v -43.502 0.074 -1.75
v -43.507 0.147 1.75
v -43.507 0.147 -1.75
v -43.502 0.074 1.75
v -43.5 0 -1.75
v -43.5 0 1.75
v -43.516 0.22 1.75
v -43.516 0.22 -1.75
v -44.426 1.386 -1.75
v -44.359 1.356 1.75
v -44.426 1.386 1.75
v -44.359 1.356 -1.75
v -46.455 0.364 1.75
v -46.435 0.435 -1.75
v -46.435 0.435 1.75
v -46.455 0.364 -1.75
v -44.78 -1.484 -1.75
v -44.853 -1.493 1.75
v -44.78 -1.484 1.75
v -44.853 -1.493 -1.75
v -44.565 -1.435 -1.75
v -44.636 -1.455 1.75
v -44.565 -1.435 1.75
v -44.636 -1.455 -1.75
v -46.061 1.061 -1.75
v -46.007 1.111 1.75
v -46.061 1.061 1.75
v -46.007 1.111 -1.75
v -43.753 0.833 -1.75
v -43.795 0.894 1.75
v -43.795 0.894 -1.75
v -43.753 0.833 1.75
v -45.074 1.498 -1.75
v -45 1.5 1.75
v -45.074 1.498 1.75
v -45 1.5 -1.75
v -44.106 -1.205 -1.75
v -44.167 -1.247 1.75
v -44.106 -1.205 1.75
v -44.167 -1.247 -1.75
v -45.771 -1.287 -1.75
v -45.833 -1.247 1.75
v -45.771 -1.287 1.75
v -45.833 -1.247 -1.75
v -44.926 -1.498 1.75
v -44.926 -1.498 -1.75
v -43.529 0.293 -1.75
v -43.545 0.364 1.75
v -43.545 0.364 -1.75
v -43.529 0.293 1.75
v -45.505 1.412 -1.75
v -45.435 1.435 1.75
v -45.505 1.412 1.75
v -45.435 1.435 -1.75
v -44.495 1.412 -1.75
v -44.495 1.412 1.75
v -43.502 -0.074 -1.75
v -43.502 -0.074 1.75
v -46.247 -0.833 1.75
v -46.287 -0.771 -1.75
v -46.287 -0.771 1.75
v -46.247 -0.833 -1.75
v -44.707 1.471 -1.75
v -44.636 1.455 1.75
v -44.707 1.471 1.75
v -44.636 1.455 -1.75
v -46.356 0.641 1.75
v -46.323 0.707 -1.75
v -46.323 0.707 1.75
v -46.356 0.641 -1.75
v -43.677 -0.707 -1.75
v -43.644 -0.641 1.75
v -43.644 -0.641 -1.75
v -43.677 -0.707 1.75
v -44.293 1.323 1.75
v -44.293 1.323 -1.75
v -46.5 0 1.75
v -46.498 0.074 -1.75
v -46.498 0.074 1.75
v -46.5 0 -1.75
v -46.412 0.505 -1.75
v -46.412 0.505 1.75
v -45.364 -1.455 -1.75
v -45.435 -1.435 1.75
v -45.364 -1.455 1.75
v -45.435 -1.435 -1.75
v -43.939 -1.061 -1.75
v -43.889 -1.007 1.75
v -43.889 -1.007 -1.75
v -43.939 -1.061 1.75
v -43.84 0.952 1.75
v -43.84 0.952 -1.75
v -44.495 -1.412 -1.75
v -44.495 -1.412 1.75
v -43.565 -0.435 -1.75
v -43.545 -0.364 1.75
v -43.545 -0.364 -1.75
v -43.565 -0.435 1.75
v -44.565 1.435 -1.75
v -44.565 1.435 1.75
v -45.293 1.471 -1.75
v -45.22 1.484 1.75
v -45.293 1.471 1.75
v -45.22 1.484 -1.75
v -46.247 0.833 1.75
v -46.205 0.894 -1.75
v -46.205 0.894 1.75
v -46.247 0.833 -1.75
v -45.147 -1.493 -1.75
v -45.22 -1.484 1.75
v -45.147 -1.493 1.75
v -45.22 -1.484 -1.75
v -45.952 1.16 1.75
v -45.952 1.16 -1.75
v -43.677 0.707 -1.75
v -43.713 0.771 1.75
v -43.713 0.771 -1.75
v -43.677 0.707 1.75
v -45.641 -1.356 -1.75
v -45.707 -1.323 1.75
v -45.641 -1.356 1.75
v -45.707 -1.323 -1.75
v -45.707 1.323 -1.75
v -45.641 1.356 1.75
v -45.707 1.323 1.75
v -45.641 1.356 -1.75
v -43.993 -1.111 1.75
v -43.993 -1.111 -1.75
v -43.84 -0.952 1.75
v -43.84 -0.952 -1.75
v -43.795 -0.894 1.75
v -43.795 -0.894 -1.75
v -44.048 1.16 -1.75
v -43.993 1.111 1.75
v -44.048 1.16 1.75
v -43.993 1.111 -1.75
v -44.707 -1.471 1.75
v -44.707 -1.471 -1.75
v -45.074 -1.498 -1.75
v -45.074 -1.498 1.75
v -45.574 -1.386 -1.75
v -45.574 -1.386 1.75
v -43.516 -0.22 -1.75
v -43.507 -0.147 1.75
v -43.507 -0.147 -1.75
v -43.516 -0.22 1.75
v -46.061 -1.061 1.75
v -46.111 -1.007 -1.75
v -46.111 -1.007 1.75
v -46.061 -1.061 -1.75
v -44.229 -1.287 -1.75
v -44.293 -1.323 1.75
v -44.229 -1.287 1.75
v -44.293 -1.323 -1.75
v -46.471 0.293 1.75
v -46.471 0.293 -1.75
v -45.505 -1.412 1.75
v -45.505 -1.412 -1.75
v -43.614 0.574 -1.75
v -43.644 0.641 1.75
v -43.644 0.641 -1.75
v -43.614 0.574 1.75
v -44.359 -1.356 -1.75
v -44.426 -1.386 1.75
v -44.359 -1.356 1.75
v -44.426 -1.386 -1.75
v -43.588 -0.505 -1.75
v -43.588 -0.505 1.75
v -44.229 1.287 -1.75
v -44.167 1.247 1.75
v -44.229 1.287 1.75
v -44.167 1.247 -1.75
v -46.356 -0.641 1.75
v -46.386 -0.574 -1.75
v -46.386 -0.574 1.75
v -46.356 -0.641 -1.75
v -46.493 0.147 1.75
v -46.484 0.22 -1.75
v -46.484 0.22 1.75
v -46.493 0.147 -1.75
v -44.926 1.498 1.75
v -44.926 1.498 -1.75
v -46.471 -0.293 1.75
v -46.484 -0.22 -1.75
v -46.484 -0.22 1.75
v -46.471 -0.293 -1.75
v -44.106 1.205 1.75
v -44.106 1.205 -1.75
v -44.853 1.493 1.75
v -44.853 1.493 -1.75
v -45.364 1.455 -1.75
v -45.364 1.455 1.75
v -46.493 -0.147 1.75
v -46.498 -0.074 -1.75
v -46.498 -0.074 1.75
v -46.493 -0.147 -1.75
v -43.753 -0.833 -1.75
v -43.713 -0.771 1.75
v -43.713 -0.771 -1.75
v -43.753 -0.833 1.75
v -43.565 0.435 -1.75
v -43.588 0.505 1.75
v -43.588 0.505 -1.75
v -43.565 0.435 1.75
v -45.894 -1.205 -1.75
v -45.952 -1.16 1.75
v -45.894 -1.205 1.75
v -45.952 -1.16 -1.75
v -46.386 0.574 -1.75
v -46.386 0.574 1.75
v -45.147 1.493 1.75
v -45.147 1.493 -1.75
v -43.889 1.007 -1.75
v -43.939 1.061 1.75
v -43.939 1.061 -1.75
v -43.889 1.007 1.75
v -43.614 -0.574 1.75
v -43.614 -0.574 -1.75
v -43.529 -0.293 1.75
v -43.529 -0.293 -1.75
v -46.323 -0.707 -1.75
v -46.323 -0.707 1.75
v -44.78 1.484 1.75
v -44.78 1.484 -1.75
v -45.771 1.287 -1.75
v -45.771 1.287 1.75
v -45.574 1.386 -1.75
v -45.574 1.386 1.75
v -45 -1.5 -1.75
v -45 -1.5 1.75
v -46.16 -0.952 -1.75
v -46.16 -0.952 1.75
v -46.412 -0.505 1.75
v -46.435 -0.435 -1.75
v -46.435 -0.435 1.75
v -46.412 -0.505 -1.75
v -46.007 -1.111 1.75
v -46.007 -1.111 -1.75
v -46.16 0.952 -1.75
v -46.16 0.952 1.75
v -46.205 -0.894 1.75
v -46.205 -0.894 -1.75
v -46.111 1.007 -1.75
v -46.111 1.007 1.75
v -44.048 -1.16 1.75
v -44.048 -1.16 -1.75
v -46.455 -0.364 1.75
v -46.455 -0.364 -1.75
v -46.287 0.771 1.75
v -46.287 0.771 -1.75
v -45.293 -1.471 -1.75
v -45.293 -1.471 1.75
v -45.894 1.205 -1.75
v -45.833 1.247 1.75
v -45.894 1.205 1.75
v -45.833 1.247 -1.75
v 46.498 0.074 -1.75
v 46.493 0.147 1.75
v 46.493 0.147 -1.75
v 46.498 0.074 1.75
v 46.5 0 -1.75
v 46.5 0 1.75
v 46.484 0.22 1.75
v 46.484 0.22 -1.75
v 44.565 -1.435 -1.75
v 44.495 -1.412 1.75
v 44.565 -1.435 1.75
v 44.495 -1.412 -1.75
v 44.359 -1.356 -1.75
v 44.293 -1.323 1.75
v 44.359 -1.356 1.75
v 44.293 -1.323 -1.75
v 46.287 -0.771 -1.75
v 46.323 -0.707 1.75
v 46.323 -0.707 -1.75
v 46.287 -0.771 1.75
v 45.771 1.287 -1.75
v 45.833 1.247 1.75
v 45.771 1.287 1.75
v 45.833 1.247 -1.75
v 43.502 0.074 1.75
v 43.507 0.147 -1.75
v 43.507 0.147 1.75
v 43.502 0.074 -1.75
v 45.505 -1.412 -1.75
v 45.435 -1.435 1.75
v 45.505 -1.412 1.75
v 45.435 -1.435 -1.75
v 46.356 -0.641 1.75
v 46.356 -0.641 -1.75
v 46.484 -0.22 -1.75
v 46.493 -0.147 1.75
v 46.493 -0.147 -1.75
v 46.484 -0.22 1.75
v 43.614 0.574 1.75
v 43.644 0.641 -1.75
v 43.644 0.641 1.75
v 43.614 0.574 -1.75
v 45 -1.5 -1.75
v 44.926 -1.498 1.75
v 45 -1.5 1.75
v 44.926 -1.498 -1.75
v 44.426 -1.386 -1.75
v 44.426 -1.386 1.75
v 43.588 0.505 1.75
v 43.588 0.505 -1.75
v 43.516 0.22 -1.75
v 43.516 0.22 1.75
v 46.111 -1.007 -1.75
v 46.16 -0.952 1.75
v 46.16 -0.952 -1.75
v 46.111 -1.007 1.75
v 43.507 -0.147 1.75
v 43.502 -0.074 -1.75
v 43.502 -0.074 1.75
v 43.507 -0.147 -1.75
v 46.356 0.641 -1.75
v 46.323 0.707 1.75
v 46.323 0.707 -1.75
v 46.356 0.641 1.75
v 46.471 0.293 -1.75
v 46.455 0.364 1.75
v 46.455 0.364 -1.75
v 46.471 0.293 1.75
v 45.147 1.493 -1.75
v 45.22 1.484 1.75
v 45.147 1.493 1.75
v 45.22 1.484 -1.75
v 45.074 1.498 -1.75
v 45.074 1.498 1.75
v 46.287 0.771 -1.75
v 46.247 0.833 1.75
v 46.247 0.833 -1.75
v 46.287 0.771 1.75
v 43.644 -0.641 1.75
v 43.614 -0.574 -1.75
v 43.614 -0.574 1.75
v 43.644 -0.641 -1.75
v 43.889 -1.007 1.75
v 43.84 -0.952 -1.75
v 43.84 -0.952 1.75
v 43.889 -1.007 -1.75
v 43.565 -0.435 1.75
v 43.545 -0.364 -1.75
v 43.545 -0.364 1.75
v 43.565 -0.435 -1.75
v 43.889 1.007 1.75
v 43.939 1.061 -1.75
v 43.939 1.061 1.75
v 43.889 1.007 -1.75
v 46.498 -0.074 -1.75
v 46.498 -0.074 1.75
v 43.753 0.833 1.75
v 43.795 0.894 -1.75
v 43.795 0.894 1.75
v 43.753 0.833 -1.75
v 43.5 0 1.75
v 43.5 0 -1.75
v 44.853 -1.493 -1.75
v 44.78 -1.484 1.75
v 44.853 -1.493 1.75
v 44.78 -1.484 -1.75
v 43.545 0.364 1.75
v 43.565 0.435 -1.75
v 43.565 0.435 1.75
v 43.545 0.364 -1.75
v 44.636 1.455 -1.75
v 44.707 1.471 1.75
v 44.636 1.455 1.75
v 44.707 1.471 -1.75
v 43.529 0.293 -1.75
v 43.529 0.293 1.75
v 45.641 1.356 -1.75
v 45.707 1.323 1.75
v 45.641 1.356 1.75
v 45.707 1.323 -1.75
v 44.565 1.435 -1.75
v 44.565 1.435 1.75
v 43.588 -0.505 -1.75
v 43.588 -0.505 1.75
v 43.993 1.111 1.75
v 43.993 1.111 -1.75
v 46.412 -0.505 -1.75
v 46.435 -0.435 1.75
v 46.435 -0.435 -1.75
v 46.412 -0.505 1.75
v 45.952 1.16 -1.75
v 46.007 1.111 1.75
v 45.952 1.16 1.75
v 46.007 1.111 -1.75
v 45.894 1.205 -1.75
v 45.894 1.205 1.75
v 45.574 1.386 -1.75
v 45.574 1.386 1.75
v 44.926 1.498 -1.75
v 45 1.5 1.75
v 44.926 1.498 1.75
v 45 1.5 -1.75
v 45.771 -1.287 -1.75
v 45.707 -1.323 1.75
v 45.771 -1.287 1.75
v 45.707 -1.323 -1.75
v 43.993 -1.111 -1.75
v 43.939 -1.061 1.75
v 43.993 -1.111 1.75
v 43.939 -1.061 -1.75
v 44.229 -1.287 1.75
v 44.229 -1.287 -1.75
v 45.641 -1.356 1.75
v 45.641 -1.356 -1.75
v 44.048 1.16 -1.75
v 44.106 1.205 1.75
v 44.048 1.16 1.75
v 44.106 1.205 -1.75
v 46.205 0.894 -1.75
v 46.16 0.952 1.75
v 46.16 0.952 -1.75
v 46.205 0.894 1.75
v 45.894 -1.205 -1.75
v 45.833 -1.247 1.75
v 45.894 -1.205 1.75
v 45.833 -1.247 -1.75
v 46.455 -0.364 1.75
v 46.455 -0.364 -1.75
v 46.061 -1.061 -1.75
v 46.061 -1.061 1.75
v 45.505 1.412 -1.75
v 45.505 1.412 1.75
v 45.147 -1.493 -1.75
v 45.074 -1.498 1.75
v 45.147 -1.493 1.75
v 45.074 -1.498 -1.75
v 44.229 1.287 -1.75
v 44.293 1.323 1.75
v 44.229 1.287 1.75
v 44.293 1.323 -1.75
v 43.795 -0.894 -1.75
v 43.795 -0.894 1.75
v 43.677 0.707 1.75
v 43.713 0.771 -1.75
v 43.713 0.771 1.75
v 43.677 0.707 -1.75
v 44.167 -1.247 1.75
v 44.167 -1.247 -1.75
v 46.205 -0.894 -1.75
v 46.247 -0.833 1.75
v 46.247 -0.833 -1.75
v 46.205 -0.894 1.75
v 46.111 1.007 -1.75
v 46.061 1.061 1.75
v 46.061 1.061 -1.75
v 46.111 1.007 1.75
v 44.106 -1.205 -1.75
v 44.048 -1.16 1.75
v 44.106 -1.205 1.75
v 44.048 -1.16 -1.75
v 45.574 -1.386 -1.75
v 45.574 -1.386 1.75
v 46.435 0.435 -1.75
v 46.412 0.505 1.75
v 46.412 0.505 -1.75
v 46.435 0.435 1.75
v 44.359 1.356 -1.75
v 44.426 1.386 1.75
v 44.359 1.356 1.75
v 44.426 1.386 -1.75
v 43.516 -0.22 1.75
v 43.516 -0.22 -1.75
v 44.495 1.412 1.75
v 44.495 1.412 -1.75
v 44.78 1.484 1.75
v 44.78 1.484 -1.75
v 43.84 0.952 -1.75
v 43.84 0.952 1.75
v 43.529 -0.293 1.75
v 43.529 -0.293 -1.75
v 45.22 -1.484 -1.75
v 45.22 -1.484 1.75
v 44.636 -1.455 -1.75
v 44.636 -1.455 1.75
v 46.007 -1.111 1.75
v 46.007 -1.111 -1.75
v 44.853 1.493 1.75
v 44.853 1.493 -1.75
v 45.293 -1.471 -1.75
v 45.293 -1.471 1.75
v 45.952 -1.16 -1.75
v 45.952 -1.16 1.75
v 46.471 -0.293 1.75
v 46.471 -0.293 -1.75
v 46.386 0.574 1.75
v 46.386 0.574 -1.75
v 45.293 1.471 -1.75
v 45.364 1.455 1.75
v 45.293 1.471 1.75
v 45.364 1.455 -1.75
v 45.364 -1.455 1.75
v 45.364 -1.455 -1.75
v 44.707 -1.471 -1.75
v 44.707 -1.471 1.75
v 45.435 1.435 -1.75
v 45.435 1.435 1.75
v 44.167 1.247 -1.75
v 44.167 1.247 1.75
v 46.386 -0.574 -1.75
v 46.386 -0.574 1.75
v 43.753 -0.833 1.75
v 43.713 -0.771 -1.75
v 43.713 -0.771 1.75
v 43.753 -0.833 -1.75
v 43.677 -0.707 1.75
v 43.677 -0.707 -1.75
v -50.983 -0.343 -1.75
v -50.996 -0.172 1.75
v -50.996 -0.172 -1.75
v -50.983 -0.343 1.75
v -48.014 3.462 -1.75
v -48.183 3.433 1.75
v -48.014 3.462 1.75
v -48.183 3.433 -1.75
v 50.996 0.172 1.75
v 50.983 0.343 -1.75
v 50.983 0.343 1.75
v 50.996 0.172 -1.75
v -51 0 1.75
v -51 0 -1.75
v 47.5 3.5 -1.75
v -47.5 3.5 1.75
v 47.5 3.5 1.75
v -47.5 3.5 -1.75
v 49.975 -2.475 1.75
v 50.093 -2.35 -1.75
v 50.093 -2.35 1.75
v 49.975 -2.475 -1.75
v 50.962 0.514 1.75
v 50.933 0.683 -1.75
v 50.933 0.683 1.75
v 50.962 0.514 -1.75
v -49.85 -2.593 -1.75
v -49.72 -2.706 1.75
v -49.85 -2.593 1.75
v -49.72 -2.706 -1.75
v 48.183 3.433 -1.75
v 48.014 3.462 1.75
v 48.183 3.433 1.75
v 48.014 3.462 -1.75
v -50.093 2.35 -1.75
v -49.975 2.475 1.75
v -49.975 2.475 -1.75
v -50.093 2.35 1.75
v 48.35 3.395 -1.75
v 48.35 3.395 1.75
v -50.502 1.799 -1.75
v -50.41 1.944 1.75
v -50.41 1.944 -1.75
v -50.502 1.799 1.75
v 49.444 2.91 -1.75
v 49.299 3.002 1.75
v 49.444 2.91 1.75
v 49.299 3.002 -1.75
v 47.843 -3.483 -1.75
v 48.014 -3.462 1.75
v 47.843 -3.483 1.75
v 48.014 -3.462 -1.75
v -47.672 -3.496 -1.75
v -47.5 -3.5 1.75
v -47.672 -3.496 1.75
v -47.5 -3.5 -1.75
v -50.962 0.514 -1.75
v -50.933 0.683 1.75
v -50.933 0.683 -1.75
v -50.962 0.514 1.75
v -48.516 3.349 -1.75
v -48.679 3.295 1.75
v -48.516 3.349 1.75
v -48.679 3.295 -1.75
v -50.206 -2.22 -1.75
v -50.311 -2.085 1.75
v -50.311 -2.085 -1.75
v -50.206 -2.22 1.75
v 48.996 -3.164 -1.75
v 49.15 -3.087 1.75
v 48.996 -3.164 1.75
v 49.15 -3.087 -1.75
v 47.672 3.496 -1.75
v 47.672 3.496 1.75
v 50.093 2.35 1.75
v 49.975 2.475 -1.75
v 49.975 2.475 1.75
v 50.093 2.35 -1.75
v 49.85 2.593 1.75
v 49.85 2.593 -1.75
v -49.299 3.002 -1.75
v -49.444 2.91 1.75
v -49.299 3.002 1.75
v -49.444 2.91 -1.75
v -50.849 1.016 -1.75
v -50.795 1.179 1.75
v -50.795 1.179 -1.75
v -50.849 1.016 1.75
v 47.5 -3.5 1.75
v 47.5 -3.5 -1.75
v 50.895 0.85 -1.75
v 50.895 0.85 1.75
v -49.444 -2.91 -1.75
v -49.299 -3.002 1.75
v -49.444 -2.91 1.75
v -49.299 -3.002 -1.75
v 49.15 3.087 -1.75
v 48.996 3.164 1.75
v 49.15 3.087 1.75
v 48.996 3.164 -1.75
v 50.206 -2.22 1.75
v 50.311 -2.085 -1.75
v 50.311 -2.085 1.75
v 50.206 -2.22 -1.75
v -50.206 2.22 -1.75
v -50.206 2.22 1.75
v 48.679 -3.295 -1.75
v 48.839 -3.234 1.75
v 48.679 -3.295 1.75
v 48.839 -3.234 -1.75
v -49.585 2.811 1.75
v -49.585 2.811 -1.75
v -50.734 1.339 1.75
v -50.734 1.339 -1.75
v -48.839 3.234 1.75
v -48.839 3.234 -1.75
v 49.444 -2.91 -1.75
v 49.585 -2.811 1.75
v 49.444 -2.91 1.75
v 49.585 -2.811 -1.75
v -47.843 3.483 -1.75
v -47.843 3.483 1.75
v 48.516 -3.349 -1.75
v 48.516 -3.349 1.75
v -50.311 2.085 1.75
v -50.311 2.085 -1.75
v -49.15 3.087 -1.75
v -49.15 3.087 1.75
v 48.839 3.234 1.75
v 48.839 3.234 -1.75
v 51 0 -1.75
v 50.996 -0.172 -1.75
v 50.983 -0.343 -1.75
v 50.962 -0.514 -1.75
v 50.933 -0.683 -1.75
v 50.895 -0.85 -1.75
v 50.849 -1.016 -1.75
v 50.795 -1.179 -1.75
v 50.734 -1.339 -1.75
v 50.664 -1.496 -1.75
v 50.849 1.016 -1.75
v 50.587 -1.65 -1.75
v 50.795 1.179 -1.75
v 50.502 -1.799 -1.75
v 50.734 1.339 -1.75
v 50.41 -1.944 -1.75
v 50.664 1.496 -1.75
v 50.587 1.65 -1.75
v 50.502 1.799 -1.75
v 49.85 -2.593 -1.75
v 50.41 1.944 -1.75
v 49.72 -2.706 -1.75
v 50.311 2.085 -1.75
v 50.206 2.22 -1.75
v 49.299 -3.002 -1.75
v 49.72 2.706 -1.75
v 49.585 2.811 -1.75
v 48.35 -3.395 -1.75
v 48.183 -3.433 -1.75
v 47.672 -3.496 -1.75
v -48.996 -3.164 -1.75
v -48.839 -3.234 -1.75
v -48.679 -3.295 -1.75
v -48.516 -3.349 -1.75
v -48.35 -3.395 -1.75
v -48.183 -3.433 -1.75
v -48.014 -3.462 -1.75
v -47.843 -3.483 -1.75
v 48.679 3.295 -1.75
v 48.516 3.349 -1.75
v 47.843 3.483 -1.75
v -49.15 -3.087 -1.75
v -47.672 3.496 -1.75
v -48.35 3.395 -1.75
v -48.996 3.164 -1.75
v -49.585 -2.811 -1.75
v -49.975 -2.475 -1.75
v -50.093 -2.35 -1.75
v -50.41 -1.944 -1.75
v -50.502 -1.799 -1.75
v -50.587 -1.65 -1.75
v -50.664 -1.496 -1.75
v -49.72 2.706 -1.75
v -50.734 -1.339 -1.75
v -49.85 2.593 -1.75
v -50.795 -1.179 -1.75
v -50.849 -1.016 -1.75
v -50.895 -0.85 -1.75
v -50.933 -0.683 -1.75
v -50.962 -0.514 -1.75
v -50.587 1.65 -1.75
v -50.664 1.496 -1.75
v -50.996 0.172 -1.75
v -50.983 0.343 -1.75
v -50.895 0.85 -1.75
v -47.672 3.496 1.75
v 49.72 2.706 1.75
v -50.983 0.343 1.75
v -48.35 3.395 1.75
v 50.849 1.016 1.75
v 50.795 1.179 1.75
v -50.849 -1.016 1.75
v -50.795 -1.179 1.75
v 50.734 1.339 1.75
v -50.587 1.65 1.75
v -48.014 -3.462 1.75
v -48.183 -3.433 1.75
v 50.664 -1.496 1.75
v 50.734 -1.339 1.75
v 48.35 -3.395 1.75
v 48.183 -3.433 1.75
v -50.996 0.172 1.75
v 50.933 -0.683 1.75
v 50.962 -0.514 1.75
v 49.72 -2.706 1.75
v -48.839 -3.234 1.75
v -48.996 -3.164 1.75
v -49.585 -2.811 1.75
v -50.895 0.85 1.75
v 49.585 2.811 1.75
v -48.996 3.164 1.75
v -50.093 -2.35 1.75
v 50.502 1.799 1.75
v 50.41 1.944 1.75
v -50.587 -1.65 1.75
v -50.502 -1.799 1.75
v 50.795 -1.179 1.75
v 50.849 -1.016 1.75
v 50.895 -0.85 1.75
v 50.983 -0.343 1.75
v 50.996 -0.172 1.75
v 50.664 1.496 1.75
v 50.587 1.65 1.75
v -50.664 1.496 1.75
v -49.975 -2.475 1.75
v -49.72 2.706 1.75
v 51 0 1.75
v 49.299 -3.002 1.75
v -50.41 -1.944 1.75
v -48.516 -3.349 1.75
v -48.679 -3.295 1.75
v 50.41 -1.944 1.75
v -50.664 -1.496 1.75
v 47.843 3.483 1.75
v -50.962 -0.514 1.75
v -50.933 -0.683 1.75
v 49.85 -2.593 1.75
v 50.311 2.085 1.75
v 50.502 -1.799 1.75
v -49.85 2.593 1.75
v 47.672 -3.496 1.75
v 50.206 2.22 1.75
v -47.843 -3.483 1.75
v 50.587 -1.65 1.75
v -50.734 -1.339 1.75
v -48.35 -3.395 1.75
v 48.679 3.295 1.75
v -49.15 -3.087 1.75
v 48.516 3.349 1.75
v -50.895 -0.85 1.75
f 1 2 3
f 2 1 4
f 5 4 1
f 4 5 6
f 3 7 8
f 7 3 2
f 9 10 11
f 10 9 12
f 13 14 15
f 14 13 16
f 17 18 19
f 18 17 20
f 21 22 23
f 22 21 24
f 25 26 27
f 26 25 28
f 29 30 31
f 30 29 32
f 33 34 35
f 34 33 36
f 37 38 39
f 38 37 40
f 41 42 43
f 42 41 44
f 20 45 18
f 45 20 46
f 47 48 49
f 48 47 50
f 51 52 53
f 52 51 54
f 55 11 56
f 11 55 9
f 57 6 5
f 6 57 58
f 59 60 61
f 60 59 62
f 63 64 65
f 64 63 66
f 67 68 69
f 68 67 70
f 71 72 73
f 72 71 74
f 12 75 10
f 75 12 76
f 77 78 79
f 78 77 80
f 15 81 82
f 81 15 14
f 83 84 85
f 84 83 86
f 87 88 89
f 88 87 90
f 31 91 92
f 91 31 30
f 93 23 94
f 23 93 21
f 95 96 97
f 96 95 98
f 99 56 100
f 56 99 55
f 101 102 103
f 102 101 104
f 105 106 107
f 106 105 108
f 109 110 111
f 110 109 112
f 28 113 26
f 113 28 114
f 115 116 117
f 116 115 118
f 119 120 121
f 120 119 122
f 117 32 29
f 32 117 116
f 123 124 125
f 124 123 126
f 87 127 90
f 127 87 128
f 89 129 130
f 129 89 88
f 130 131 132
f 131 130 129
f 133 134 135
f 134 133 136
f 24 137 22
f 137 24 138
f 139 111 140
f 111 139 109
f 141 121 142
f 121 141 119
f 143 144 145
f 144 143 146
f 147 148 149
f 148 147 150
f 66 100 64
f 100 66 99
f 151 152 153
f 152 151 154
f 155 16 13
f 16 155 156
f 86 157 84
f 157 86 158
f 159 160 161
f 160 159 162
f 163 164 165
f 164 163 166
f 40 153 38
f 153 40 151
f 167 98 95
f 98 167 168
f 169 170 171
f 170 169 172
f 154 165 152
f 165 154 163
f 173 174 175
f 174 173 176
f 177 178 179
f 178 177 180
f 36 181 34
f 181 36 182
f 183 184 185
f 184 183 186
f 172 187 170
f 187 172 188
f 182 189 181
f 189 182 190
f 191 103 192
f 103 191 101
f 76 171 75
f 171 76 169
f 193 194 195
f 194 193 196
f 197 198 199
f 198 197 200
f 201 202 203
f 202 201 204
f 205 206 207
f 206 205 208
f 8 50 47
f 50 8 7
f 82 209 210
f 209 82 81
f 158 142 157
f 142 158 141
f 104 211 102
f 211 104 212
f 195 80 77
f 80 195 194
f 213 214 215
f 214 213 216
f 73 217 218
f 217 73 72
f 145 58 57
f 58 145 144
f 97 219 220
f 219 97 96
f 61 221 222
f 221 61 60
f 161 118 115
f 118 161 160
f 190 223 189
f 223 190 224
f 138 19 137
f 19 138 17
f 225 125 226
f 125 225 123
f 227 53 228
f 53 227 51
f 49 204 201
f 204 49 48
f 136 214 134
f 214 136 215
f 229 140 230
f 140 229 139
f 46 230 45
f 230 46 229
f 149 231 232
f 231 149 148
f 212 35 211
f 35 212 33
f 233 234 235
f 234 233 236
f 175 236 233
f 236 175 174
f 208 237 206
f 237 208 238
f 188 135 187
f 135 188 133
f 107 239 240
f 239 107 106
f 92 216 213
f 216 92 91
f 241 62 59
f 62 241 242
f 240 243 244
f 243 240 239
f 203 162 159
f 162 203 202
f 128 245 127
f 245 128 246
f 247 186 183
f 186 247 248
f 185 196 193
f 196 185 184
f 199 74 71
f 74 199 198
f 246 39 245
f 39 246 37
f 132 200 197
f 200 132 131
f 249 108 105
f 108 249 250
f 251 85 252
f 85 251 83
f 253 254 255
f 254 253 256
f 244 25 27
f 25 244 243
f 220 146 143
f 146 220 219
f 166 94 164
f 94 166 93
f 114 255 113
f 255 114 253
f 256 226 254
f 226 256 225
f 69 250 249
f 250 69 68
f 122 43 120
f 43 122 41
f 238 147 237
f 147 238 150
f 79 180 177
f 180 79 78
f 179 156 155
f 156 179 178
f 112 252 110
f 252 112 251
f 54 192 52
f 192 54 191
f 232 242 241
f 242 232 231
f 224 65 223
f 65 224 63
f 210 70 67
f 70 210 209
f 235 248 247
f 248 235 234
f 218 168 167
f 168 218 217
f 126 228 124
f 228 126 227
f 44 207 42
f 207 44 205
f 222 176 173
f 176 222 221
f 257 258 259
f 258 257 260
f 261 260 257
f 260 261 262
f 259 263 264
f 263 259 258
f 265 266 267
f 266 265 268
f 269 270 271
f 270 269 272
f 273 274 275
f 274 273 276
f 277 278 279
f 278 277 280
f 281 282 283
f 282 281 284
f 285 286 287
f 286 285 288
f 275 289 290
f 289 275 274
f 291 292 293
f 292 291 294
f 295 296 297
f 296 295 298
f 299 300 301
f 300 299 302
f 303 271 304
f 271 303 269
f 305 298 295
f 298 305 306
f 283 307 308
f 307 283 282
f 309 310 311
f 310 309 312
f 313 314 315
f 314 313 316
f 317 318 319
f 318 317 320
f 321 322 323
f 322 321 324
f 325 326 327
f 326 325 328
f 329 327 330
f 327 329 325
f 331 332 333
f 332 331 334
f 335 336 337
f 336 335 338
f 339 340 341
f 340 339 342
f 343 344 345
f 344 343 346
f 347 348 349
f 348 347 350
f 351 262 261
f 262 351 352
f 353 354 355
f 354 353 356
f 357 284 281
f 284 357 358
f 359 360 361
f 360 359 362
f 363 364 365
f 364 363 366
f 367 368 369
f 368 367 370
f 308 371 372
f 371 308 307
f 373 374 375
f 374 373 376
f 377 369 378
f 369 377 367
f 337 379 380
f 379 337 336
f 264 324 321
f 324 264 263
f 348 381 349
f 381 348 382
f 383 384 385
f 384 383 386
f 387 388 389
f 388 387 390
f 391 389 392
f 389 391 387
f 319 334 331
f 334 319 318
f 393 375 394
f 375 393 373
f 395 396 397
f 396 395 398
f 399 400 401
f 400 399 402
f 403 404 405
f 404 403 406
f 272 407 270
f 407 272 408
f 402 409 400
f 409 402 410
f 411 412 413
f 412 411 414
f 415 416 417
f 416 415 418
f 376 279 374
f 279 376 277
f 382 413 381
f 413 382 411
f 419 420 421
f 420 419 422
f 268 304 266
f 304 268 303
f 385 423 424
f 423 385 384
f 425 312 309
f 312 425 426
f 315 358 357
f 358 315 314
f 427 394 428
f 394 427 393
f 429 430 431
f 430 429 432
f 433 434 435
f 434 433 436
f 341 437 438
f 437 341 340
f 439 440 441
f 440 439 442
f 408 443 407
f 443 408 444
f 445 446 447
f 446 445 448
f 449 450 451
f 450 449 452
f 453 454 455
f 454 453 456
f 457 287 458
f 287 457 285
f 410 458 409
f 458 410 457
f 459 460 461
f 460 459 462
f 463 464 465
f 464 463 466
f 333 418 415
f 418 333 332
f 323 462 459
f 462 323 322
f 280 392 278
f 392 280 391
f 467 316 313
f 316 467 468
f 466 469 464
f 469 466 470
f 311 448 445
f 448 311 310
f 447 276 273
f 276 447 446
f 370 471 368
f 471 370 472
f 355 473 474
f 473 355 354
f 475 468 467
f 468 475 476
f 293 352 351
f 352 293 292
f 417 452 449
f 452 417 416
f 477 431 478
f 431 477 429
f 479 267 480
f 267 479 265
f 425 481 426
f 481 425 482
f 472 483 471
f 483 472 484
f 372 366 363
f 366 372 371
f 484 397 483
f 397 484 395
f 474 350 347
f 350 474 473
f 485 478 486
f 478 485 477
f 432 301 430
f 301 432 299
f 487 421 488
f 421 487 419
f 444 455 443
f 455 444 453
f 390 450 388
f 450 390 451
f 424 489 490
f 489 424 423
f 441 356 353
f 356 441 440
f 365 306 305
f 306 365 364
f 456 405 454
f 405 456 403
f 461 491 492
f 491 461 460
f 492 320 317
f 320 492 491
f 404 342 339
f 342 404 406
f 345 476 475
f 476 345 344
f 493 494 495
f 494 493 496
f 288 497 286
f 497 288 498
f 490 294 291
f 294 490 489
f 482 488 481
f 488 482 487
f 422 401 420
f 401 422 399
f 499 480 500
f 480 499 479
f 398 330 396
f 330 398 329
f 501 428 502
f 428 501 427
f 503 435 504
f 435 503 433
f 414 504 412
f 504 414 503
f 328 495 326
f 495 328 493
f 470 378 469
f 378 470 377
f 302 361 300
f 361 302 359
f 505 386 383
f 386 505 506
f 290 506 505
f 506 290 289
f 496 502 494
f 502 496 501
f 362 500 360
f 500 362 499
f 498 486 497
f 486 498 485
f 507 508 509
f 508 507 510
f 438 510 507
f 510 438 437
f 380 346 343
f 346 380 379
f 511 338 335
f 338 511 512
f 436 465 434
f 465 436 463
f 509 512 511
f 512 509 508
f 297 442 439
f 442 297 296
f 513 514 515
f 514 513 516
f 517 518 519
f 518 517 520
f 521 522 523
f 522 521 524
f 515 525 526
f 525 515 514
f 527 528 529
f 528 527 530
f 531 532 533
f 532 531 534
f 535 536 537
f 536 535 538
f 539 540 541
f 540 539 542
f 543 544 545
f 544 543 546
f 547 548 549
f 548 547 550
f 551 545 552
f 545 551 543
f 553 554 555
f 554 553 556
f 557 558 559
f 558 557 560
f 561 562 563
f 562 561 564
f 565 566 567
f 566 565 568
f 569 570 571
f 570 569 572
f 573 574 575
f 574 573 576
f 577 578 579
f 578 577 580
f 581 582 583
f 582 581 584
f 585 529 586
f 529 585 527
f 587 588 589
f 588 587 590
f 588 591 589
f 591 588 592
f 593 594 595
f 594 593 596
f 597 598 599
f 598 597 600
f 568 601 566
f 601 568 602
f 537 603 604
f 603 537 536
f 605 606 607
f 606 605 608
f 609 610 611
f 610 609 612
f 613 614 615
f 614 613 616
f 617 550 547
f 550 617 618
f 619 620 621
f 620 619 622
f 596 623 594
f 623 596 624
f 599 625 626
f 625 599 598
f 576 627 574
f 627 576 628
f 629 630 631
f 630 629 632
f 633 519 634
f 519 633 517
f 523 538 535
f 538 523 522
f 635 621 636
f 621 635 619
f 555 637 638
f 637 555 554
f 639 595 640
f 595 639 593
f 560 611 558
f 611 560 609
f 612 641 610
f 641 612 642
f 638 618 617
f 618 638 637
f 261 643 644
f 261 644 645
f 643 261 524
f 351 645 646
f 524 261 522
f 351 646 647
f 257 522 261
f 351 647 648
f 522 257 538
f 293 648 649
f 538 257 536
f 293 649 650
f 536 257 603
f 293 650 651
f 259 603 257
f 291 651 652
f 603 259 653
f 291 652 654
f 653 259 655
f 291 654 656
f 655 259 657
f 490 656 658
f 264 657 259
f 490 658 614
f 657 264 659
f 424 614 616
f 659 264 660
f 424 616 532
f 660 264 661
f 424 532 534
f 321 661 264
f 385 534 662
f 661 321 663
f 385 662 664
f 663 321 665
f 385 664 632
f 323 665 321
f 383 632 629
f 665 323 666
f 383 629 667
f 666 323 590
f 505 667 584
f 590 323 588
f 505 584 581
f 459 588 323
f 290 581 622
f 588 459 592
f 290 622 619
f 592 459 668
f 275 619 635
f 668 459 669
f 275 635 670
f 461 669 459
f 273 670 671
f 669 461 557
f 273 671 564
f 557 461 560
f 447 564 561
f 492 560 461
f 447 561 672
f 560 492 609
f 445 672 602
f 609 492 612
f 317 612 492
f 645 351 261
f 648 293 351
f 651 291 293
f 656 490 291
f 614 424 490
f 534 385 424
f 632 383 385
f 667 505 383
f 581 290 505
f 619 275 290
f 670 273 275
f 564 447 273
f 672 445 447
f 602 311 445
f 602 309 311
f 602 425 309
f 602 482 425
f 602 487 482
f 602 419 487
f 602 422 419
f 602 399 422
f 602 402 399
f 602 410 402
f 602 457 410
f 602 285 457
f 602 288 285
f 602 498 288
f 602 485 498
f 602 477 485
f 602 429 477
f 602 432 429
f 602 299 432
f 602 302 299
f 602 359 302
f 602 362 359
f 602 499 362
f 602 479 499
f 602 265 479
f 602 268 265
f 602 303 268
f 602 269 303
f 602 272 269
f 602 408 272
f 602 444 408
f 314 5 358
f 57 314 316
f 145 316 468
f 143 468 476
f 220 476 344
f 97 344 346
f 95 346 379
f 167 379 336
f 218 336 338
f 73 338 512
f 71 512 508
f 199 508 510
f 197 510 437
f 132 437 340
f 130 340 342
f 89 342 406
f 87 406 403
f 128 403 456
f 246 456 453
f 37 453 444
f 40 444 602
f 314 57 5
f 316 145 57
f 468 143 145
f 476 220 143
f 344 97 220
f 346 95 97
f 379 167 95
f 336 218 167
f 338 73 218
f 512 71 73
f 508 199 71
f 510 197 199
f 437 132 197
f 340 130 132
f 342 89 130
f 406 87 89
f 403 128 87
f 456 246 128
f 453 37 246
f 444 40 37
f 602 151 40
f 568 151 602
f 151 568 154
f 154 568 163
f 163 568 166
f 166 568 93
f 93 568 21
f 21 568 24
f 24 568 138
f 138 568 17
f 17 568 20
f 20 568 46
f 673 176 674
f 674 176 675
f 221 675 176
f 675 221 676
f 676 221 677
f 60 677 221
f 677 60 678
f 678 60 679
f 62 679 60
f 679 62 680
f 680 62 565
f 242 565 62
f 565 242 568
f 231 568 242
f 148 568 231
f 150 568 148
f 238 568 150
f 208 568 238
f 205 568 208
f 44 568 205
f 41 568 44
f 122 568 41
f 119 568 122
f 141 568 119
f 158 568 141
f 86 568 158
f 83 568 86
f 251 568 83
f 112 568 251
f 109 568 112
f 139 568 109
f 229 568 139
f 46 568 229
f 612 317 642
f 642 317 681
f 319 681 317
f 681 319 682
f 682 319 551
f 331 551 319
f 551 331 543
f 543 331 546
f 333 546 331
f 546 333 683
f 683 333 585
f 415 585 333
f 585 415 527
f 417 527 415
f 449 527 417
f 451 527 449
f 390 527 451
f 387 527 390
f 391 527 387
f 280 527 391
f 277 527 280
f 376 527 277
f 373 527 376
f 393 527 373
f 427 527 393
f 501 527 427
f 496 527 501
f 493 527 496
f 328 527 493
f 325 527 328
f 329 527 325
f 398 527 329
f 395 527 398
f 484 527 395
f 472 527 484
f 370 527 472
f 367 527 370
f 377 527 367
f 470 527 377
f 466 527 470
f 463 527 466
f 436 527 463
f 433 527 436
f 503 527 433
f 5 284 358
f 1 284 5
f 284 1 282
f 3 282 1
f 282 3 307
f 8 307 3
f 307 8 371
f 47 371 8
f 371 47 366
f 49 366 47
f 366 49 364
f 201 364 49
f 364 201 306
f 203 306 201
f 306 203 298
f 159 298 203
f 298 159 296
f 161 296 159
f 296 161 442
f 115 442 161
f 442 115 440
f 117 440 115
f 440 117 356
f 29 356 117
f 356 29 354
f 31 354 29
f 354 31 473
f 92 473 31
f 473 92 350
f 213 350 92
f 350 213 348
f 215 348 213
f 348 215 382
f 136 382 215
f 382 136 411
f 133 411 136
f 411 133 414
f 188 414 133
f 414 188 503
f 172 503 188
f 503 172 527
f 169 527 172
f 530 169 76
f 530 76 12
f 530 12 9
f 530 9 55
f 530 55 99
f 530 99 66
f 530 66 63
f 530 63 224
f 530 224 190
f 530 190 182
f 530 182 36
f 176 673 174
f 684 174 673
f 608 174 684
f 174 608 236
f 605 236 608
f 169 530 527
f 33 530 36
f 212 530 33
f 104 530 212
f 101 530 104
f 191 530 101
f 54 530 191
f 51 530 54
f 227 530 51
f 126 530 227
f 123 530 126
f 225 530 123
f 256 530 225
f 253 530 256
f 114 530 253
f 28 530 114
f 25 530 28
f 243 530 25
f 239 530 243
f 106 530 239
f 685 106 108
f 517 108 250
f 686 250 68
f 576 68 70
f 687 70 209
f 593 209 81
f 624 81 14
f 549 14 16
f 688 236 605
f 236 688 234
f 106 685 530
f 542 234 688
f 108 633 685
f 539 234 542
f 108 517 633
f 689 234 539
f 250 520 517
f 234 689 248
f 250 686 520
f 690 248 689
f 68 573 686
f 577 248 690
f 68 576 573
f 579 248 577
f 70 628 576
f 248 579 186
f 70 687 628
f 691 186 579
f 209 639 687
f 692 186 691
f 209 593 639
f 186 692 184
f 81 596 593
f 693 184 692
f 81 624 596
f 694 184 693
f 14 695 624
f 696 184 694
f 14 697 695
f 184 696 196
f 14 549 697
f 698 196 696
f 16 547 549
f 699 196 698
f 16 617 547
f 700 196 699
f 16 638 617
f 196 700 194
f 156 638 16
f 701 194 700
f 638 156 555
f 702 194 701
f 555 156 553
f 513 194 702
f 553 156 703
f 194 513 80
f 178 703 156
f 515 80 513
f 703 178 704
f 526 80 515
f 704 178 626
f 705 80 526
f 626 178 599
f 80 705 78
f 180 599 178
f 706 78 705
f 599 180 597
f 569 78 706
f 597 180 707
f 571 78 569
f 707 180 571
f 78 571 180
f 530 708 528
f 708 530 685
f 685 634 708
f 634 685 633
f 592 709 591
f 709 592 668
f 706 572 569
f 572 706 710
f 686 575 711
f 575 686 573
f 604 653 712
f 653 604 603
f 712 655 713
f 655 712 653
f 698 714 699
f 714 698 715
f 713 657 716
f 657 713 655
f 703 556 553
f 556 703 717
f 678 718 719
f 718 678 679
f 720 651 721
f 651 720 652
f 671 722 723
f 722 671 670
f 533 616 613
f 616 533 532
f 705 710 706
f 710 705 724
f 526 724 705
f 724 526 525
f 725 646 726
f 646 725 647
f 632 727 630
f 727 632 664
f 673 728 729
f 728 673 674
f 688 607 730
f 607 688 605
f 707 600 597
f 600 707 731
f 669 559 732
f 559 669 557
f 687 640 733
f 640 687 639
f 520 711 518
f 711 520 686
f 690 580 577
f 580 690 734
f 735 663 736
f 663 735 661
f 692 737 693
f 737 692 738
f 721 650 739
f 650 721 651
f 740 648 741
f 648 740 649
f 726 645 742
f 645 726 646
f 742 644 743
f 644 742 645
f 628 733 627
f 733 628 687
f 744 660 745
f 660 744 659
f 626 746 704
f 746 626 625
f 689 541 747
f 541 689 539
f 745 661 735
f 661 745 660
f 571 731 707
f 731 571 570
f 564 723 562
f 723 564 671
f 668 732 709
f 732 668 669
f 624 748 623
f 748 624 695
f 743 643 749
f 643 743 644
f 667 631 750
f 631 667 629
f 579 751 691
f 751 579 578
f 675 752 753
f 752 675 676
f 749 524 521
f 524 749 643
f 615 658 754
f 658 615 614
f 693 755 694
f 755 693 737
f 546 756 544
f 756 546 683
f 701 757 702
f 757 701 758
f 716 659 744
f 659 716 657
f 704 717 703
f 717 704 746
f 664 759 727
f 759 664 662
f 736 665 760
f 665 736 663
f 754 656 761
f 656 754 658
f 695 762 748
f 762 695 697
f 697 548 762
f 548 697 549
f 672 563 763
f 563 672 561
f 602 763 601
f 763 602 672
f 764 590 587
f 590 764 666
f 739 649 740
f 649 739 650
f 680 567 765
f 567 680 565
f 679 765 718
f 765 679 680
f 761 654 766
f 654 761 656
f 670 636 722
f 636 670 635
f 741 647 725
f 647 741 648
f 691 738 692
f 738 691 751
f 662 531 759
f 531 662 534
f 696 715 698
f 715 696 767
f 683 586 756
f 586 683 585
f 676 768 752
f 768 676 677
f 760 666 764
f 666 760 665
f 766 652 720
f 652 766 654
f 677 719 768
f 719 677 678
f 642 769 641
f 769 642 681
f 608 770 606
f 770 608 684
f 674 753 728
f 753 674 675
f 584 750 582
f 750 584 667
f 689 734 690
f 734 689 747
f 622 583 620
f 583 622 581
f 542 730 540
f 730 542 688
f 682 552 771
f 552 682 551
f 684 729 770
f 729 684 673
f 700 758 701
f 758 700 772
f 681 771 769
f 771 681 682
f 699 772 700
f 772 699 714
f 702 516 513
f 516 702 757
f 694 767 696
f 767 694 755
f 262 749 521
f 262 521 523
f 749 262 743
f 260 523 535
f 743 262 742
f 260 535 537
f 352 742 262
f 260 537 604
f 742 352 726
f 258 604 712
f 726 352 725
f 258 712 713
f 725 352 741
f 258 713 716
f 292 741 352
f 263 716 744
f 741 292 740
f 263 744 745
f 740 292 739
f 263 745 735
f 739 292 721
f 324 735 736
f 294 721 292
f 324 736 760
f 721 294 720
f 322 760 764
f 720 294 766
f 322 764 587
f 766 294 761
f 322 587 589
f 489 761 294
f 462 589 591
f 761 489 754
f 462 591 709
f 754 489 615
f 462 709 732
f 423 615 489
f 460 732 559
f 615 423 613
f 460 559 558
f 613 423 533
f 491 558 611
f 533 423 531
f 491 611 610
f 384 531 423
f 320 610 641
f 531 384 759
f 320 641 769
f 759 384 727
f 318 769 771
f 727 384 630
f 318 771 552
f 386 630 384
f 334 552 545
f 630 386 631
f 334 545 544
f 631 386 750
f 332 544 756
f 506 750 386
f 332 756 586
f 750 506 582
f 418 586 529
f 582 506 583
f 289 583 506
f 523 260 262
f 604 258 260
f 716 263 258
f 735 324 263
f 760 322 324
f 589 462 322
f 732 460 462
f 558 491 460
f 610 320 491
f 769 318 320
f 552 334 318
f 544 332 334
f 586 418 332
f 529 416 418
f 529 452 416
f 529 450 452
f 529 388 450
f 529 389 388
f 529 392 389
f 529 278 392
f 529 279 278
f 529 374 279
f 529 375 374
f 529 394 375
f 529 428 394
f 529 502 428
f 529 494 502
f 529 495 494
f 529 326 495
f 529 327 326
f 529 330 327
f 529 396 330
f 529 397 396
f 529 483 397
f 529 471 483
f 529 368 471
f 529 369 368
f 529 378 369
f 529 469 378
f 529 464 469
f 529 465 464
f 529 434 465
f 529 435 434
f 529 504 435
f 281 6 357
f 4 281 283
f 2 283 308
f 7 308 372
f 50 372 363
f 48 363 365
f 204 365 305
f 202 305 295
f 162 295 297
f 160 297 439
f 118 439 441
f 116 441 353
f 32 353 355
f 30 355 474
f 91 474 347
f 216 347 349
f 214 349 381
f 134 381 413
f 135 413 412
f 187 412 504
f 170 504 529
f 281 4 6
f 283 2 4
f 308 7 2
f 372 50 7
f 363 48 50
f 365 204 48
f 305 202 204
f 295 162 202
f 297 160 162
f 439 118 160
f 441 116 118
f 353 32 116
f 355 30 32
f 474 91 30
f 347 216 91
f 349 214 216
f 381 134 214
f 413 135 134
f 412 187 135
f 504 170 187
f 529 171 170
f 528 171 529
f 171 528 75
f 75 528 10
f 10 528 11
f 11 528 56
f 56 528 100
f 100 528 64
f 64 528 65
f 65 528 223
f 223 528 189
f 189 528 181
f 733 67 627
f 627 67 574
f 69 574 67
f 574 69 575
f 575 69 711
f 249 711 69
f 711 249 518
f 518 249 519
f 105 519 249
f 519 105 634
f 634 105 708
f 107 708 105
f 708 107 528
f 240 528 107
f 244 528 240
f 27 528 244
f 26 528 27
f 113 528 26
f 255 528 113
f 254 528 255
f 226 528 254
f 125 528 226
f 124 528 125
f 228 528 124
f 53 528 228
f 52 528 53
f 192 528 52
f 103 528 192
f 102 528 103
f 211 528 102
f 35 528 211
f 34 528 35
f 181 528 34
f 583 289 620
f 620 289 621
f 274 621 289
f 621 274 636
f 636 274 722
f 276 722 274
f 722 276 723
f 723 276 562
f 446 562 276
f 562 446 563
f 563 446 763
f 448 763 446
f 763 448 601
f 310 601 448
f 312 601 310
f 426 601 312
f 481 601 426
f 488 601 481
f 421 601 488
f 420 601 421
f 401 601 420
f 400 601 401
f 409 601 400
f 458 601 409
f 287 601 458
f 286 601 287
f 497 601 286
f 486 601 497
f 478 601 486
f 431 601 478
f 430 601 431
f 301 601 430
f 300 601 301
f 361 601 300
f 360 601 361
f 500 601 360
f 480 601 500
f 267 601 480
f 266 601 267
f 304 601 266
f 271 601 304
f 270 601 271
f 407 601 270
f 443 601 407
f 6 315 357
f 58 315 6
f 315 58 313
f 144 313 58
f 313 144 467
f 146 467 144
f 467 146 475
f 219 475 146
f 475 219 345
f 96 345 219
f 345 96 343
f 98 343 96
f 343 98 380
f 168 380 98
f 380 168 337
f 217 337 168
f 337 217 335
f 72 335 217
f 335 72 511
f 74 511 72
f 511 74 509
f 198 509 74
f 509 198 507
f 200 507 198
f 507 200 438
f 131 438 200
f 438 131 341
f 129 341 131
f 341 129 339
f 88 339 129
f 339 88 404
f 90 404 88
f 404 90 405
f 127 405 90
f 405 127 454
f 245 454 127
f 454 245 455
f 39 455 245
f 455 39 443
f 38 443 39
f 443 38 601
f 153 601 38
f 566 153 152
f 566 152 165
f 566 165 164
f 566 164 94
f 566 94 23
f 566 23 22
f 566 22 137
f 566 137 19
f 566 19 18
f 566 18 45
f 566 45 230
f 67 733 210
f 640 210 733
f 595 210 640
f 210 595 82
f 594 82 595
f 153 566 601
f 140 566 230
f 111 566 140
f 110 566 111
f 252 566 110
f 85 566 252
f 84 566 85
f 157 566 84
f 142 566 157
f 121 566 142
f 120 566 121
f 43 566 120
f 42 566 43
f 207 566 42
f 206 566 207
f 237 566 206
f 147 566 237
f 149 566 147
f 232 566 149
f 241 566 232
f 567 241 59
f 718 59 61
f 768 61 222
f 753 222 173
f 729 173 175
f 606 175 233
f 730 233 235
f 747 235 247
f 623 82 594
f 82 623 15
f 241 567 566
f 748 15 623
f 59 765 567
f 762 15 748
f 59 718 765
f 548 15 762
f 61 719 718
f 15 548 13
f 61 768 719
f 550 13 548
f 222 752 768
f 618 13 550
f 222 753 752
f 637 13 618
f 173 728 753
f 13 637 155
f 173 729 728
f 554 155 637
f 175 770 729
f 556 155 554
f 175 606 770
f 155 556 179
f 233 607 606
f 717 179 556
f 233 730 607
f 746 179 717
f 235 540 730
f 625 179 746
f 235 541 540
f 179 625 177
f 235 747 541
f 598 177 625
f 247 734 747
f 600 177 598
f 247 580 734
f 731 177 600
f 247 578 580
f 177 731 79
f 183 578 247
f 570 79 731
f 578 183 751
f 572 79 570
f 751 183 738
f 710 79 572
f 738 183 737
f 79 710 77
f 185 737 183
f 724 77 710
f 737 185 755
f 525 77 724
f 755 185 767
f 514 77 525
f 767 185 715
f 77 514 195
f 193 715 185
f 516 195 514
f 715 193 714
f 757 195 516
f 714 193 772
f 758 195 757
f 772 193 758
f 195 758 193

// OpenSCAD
// Long flat link/strap with rounded ends and two through-holes
// Bounding box target: 102.0 x 7.0 x 3.5 mm (X x Y x Z)

$fn = 128;  // smooth, clearly circular holes

// Parameters
L = 102.0;                 // overall length (X)
W = 7.0;                   // overall width (Y)
T = 3.5;                   // thickness (Z)
end_radius = W/2;          // rounded end radius to match width
hole_d = 3.0;              // through-hole diameter
hole_offset_from_end = 6.0;// hole center offset from each end along X
hole_clearance_z = 0.5;    // extra cut height to guarantee through-cut

// Derived
core_len = L - 2*end_radius;                 // straight section length
end_center_x = L/2 - end_radius;             // x position of end-cap centers
hole_x = L/2 - hole_offset_from_end;         // x position of hole centers

module strap_solid() {
    // Build as a 2D rounded-rectangle then linear_extrude for robust, connected geometry
    linear_extrude(height=T, center=true, convexity=10)
        hull() {
            translate([ end_center_x, 0]) circle(r=end_radius);
            translate([-end_center_x, 0]) circle(r=end_radius);
        }
}

module holes() {
    // Cut cylinders through thickness (Z)
    for (sx = [-1, 1])
        translate([sx*hole_x, 0, 0])
            cylinder(d=hole_d, h=T + 2*hole_clearance_z, center=true);
}

difference() {
    strap_solid();
    holes();
}
